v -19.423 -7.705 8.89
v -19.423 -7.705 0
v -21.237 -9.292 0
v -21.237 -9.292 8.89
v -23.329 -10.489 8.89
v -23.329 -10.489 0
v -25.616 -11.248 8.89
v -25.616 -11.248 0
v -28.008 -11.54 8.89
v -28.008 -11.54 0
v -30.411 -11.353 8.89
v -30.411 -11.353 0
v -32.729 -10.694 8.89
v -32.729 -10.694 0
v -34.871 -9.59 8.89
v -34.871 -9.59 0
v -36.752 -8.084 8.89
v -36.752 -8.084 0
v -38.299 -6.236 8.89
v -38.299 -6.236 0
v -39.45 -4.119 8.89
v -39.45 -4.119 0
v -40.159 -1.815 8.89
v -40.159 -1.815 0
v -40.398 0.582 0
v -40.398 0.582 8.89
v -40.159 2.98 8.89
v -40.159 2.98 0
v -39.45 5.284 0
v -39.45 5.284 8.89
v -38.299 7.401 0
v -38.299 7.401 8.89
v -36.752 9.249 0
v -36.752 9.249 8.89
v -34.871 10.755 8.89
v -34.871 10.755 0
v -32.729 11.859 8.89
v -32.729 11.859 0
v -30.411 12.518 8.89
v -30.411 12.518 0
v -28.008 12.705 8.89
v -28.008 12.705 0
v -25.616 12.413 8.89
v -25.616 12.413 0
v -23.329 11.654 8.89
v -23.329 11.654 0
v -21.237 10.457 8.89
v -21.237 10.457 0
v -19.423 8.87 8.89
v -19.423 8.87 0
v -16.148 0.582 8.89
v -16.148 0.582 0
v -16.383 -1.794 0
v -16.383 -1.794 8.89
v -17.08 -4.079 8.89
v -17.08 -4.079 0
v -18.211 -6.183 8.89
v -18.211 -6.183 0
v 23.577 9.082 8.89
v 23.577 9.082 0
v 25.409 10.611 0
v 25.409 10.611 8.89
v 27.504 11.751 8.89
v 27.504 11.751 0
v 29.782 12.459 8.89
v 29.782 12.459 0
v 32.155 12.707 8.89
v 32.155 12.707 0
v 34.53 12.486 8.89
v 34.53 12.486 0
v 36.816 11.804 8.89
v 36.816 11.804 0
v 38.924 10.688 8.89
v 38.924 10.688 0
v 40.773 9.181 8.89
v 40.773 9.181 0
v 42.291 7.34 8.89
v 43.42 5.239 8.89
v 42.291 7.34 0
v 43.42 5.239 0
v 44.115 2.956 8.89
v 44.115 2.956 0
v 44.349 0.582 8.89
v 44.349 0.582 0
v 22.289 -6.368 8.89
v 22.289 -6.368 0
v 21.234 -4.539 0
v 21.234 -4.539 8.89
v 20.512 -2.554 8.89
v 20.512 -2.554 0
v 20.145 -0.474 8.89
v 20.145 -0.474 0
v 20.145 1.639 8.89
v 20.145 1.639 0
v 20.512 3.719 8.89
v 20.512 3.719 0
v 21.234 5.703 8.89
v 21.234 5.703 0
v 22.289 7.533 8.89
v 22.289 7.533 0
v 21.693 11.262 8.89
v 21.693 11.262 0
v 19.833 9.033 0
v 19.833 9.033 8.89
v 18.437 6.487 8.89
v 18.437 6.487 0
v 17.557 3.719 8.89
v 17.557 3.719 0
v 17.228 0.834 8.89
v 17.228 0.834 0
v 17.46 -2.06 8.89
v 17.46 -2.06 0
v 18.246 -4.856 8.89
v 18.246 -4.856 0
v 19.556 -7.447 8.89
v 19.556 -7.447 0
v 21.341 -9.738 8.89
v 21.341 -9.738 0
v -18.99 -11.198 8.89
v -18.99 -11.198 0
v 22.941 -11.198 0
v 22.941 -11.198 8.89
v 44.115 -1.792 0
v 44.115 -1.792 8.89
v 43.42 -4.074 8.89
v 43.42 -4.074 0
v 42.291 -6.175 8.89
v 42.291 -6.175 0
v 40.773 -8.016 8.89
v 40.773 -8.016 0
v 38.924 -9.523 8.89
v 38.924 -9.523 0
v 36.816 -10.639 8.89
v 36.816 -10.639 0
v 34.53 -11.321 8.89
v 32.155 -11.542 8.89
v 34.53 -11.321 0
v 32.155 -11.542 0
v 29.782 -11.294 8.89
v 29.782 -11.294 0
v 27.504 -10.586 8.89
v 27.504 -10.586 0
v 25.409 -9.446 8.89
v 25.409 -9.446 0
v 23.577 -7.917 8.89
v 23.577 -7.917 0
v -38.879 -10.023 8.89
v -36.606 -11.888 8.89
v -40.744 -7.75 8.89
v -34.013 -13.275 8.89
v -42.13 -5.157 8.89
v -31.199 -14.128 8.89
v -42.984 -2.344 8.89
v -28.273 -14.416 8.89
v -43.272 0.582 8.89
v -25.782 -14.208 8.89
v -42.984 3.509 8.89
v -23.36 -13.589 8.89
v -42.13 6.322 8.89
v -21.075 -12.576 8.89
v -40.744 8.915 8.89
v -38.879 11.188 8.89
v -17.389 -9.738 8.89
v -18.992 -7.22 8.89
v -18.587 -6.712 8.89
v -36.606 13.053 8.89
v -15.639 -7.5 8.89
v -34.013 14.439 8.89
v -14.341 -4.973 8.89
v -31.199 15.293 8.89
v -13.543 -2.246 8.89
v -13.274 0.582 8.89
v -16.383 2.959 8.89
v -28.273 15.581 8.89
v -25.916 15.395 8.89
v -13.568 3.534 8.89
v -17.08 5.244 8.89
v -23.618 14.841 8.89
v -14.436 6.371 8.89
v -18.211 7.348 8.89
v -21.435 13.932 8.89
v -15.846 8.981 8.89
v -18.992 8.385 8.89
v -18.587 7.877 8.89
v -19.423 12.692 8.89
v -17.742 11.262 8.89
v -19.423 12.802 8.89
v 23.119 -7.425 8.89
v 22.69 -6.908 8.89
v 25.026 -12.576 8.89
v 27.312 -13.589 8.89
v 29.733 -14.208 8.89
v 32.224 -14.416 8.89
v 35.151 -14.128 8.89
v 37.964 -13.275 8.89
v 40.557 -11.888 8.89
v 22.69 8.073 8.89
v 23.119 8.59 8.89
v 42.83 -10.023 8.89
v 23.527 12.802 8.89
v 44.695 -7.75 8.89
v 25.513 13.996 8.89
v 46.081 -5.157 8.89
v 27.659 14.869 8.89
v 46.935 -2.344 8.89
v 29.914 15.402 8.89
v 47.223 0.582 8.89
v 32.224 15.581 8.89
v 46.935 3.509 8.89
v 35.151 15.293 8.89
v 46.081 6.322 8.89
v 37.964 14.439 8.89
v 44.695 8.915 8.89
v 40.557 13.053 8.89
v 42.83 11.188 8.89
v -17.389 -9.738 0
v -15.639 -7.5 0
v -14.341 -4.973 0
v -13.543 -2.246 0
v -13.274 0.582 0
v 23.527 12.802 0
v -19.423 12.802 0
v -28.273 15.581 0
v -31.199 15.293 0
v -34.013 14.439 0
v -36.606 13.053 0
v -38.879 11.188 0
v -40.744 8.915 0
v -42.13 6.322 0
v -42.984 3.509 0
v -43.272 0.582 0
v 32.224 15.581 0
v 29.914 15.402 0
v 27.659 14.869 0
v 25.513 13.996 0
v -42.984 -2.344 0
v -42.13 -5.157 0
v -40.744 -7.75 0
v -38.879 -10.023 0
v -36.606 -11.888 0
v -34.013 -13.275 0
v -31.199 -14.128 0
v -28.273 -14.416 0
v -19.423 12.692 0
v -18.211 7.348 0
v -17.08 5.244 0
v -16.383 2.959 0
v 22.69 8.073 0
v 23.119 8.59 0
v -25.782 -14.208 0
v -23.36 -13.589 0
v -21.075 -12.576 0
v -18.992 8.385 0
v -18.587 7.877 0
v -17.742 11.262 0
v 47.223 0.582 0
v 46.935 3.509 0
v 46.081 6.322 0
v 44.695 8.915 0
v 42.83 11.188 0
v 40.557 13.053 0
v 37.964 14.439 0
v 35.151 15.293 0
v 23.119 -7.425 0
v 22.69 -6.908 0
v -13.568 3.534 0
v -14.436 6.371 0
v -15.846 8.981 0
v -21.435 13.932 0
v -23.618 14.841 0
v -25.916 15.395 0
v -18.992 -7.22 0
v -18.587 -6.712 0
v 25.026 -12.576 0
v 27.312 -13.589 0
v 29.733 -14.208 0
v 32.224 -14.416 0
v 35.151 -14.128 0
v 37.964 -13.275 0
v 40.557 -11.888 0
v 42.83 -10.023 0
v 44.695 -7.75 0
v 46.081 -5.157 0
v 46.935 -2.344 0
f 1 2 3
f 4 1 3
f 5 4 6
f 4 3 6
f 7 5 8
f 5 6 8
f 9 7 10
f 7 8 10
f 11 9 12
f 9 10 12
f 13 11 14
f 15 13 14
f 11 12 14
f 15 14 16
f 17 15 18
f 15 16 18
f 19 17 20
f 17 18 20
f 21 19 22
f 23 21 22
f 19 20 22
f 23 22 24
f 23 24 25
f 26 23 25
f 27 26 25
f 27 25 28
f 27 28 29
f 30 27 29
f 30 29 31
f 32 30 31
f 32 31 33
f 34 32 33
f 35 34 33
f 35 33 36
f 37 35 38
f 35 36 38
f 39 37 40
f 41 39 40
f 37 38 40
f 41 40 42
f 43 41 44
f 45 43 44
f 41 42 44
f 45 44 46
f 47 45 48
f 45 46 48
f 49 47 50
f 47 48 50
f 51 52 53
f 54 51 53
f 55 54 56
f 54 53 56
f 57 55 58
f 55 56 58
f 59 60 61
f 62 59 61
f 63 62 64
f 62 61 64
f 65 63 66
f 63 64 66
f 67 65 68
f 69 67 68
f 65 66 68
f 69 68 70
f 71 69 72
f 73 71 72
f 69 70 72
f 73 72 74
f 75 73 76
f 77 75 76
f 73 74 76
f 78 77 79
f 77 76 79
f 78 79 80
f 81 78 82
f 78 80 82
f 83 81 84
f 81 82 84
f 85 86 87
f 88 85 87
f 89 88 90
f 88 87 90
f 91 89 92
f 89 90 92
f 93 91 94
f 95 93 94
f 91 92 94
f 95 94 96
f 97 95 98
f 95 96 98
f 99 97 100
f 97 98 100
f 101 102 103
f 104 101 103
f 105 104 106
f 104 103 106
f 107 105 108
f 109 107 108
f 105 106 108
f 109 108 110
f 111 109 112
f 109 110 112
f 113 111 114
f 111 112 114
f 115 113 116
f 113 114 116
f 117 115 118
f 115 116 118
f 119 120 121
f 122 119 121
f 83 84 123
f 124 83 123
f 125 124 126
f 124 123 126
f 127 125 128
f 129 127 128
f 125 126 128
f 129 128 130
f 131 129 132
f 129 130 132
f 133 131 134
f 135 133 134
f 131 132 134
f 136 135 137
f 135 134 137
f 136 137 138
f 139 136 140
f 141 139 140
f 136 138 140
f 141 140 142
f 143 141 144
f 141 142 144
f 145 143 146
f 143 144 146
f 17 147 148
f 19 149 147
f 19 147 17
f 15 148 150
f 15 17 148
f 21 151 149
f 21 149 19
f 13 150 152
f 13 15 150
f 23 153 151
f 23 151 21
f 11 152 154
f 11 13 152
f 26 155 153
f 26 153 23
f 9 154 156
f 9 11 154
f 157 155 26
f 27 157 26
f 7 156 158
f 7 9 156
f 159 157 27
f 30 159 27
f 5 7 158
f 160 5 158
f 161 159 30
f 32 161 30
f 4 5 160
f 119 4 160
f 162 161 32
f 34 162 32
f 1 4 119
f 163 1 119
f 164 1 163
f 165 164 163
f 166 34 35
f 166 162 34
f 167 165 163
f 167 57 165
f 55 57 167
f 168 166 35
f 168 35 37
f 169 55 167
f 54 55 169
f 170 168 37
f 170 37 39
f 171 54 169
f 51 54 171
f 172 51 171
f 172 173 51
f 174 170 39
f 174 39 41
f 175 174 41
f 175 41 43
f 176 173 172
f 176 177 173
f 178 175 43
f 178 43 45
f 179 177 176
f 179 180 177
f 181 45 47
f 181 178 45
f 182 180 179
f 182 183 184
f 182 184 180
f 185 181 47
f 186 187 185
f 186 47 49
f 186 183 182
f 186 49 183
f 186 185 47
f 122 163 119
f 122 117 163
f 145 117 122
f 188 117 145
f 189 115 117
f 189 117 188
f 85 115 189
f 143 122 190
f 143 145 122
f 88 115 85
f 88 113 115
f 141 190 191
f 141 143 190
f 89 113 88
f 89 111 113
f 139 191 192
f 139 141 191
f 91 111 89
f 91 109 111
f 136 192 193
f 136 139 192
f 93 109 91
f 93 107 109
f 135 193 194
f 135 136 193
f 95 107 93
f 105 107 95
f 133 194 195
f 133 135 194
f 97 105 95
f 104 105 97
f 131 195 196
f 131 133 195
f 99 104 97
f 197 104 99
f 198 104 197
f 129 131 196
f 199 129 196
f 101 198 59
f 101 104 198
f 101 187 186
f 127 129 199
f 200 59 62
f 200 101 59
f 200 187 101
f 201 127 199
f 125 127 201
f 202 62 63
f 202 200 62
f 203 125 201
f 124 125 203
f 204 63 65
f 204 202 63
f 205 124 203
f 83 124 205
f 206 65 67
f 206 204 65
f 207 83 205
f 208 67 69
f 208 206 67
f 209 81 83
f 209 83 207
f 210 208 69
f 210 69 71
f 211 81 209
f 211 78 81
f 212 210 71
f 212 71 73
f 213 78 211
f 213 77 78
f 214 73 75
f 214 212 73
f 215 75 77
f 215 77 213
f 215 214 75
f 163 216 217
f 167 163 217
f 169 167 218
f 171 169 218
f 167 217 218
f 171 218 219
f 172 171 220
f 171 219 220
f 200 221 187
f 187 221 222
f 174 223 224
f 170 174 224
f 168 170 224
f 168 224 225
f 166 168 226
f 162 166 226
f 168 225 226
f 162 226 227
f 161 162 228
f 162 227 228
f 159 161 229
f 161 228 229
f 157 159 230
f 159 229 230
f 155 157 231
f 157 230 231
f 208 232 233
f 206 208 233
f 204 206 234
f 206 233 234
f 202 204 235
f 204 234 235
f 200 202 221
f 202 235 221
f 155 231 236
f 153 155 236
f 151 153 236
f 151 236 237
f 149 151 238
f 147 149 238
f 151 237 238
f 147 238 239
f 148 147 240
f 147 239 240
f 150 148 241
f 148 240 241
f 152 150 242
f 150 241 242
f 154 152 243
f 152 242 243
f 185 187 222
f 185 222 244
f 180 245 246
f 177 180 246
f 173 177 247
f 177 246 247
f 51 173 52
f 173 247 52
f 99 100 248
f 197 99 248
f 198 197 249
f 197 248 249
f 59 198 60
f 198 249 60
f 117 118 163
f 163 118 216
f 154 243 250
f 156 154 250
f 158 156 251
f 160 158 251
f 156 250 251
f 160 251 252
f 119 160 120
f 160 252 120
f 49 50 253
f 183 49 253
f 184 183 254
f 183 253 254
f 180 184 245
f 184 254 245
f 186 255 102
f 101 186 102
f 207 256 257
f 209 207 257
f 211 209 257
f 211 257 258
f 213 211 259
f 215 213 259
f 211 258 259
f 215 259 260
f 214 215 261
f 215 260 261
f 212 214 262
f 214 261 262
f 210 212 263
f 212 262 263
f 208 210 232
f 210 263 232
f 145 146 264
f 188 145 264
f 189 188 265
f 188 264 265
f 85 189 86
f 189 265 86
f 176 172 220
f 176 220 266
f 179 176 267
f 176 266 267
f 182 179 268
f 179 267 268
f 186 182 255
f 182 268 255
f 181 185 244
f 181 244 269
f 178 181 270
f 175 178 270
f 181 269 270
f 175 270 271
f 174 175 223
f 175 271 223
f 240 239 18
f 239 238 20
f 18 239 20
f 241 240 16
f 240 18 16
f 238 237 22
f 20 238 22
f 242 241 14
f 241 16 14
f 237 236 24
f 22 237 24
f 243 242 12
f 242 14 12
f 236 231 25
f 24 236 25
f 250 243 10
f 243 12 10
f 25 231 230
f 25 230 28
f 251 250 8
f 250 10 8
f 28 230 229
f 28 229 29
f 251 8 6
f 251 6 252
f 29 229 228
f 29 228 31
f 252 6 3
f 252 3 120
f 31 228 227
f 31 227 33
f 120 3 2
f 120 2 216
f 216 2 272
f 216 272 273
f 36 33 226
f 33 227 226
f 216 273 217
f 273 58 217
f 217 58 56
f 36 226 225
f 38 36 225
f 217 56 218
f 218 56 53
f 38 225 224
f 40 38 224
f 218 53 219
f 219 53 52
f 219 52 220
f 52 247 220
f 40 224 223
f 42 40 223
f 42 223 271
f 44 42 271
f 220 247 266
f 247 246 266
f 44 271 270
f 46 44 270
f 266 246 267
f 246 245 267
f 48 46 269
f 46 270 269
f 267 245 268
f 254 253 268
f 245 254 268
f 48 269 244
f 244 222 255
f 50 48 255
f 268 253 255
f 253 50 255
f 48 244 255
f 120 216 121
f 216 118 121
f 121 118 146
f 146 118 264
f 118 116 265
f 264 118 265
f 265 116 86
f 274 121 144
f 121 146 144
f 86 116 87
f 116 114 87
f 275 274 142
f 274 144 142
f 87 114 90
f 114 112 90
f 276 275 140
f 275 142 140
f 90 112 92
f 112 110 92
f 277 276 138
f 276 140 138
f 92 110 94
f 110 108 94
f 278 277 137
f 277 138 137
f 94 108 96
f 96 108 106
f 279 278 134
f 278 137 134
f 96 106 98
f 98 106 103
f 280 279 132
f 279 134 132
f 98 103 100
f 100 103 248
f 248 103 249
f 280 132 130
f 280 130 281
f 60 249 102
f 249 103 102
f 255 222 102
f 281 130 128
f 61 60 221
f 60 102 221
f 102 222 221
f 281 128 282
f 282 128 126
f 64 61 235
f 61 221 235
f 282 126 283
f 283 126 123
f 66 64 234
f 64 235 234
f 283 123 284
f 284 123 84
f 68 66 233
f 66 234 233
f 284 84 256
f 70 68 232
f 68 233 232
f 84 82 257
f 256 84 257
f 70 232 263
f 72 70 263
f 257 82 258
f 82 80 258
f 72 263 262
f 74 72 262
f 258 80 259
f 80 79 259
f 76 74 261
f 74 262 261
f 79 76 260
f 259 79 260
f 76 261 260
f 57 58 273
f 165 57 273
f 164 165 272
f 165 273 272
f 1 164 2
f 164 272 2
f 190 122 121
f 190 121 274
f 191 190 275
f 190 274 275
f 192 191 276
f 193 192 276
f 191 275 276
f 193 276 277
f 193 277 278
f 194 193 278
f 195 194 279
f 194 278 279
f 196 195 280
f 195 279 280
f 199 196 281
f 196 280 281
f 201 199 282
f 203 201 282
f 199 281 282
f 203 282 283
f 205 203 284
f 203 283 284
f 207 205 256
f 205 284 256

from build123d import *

# Parameters (mm, degrees)
F1_DEPTH = 8.89


with BuildPart() as f1:
    # F0 (on Top) → F1 (new body)
    with BuildSketch(Plane.XY):
        with BuildLine():
            Line((-18.9896195369, -11.198009608), (-19.4227703597, -11.198009608))
            Line((-19.4227703597, -11.198009608), (-19.4227703597, -7.7054101467))
            ThreePointArc((-19.4227703597, -7.7054101467), (-40.3979995929, 0.5824766479), (-19.4227703597, 8.8703634425))
            Line((-19.4227703597, 8.8703634425), (-19.4227703597, 12.6917476503))
            ThreePointArc((-19.4227703597, 12.6917476503), (-23.6180195335, 14.8405326983), (-28.2729995929, 15.5811766479))
            ThreePointArc((-28.2729995929, 15.5811766479), (-38.8786820719, 11.1881591269), (-43.2716995929, 0.5824766479))
            ThreePointArc((-43.2716995929, 0.5824766479), (-38.8786820719, -10.0232058311), (-28.2729995929, -14.4162233521))
            ThreePointArc((-28.2729995929, -14.4162233521), (-23.3603107933, -13.5888496996), (-18.9896195369, -11.198009608))
        make_face()
        with BuildLine():
            Line((-18.2107055563, -9.7378878497), (-17.3894763432, -9.7378878497))
            ThreePointArc((-17.3894763432, -9.7378878497), (-14.3410273374, -4.9728046917), (-13.2742995929, 0.5824766479))
            ThreePointArc((-13.2742995929, 0.5824766479), (-14.4361743904, 6.3706775779), (-17.7417894428, 11.2621121503))
            Line((-17.7417894428, 11.2621121503), (-18.2107055563, 11.2621121503))
            Line((-18.2107055563, 11.2621121503), (-18.2107055563, 7.3475238555))
            ThreePointArc((-18.2107055563, 7.3475238555), (-16.675134699, 4.1187394921), (-16.1479995929, 0.5824766479))
            ThreePointArc((-16.1479995929, 0.5824766479), (-16.675134699, -2.9537861963), (-18.2107055563, -6.1825705597))
            Line((-18.2107055563, -6.1825705597), (-18.2107055563, -9.7378878497))
        make_face()
        with BuildLine():
            Line((-19.4227703597, -7.7054101467), (-19.4227703597, -11.198009608))
            Line((-19.4227703597, -11.198009608), (-18.9896195369, -11.198009608))
            ThreePointArc((-18.9896195369, -11.198009608), (-18.1631535939, -10.4968742161), (-17.3894763432, -9.7378878497))
            Line((-17.3894763432, -9.7378878497), (-18.2107055563, -9.7378878497))
            Line((-18.2107055563, -9.7378878497), (-18.2107055563, -6.1825705597))
            ThreePointArc((-18.2107055563, -6.1825705597), (-18.7861326596, -6.9683498493), (-19.4227703597, -7.7054101467))
        make_face()
        with BuildLine():
            ThreePointArc((-17.3894763432, -9.7378878497), (-18.1631535939, -10.4968742161), (-18.9896195369, -11.198009608))
            Line((-18.9896195369, -11.198009608), (22.9410203511, -11.198009608))
            ThreePointArc((22.9410203511, -11.198009608), (22.1145544081, -10.4968742161), (21.3408771574, -9.7378878497))
            Line((21.3408771574, -9.7378878497), (-17.3894763432, -9.7378878497))
        make_face()
        with BuildLine():
            Line((-19.4227703597, 12.6917476503), (-19.4227703597, 8.8703634425))
            ThreePointArc((-19.4227703597, 8.8703634425), (-18.7861326596, 8.133303145), (-18.2107055563, 7.3475238555))
            Line((-18.2107055563, 7.3475238555), (-18.2107055563, 11.2621121503))
            Line((-18.2107055563, 11.2621121503), (-17.7417894428, 11.2621121503))
            ThreePointArc((-17.7417894428, 11.2621121503), (-18.5559520702, 12.0078864494), (-19.4227703597, 12.6917476503))
        make_face()
        with BuildLine():
            Line((-19.4227703597, 12.801990392), (-19.4227703597, 12.6917476503))
            ThreePointArc((-19.4227703597, 12.6917476503), (-18.5559520702, 12.0078864494), (-17.7417894428, 11.2621121503))
            Line((-17.7417894428, 11.2621121503), (21.693190257, 11.2621121503))
            ThreePointArc((21.693190257, 11.2621121503), (22.5793232744, 12.0687070475), (23.5270165736, 12.801990392))
            Line((23.5270165736, 12.801990392), (-19.4227703597, 12.801990392))
        make_face()
        with BuildLine():
            ThreePointArc((23.5270165736, 12.801990392), (22.5793232744, 12.0687070475), (21.693190257, 11.2621121503))
            Line((21.693190257, 11.2621121503), (22.2892944437, 11.2621121503))
            Line((22.2892944437, 11.2621121503), (22.2892944437, 7.5329654434))
            ThreePointArc((22.2892944437, 7.5329654434), (22.9010353132, 8.334282136), (23.5772296403, 9.0820097368))
            Line((23.5772296403, 9.0820097368), (23.5772296403, 12.801990392))
            Line((23.5772296403, 12.801990392), (23.5270165736, 12.801990392))
        make_face()
        with BuildLine():
            Line((23.5772296403, -11.198009608), (22.9410203511, -11.198009608))
            ThreePointArc((22.9410203511, -11.198009608), (27.3117115612, -13.5888496836), (32.2244003091, -14.4162233521))
            ThreePointArc((32.2244003091, -14.4162233521), (42.8300828514, -10.0232058658), (47.2231004071, 0.5824766479))
            ThreePointArc((47.2231004071, 0.5824766479), (42.8300828861, 11.1881591269), (32.2244004071, 15.5811766479))
            ThreePointArc((32.2244004071, 15.5811766479), (27.6590865682, 14.8694956246), (23.5270165736, 12.801990392))
            Line((23.5270165736, 12.801990392), (23.5772296403, 12.801990392))
            Line((23.5772296403, 12.801990392), (23.5772296403, 9.0820097368))
            ThreePointArc((23.5772296403, 9.0820097368), (36.8161690997, 11.8043875936), (44.3494004071, 0.5824766479))
            ThreePointArc((44.3494004071, 0.5824766479), (36.8161690997, -10.6394342978), (23.5772296403, -7.9170564411))
            Line((23.5772296403, -7.9170564411), (23.5772296403, -11.198009608))
        make_face()
        with BuildLine():
            ThreePointArc((21.3408771574, -9.7378878497), (22.1145544081, -10.4968742161), (22.9410203511, -11.198009608))
            Line((22.9410203511, -11.198009608), (23.5772296403, -11.198009608))
            Line((23.5772296403, -11.198009608), (23.5772296403, -7.9170564411))
            ThreePointArc((23.5772296403, -7.9170564411), (22.9010353132, -7.1693288402), (22.2892944437, -6.3680121476))
            Line((22.2892944437, -6.3680121476), (22.2892944437, -9.7378878497))
            Line((22.2892944437, -9.7378878497), (21.3408771574, -9.7378878497))
        make_face()
        with BuildLine():
            ThreePointArc((21.693190257, 11.2621121503), (17.2278107399, 0.8340716473), (21.3408771574, -9.7378878497))
            Line((21.3408771574, -9.7378878497), (22.2892944437, -9.7378878497))
            Line((22.2892944437, -9.7378878497), (22.2892944437, -6.3680121476))
            ThreePointArc((22.2892944437, -6.3680121476), (20.0994004071, 0.5824766479), (22.2892944437, 7.5329654434))
            Line((22.2892944437, 7.5329654434), (22.2892944437, 11.2621121503))
            Line((22.2892944437, 11.2621121503), (21.693190257, 11.2621121503))
        make_face()
    extrude(amount=F1_DEPTH)


solid = f1.part
